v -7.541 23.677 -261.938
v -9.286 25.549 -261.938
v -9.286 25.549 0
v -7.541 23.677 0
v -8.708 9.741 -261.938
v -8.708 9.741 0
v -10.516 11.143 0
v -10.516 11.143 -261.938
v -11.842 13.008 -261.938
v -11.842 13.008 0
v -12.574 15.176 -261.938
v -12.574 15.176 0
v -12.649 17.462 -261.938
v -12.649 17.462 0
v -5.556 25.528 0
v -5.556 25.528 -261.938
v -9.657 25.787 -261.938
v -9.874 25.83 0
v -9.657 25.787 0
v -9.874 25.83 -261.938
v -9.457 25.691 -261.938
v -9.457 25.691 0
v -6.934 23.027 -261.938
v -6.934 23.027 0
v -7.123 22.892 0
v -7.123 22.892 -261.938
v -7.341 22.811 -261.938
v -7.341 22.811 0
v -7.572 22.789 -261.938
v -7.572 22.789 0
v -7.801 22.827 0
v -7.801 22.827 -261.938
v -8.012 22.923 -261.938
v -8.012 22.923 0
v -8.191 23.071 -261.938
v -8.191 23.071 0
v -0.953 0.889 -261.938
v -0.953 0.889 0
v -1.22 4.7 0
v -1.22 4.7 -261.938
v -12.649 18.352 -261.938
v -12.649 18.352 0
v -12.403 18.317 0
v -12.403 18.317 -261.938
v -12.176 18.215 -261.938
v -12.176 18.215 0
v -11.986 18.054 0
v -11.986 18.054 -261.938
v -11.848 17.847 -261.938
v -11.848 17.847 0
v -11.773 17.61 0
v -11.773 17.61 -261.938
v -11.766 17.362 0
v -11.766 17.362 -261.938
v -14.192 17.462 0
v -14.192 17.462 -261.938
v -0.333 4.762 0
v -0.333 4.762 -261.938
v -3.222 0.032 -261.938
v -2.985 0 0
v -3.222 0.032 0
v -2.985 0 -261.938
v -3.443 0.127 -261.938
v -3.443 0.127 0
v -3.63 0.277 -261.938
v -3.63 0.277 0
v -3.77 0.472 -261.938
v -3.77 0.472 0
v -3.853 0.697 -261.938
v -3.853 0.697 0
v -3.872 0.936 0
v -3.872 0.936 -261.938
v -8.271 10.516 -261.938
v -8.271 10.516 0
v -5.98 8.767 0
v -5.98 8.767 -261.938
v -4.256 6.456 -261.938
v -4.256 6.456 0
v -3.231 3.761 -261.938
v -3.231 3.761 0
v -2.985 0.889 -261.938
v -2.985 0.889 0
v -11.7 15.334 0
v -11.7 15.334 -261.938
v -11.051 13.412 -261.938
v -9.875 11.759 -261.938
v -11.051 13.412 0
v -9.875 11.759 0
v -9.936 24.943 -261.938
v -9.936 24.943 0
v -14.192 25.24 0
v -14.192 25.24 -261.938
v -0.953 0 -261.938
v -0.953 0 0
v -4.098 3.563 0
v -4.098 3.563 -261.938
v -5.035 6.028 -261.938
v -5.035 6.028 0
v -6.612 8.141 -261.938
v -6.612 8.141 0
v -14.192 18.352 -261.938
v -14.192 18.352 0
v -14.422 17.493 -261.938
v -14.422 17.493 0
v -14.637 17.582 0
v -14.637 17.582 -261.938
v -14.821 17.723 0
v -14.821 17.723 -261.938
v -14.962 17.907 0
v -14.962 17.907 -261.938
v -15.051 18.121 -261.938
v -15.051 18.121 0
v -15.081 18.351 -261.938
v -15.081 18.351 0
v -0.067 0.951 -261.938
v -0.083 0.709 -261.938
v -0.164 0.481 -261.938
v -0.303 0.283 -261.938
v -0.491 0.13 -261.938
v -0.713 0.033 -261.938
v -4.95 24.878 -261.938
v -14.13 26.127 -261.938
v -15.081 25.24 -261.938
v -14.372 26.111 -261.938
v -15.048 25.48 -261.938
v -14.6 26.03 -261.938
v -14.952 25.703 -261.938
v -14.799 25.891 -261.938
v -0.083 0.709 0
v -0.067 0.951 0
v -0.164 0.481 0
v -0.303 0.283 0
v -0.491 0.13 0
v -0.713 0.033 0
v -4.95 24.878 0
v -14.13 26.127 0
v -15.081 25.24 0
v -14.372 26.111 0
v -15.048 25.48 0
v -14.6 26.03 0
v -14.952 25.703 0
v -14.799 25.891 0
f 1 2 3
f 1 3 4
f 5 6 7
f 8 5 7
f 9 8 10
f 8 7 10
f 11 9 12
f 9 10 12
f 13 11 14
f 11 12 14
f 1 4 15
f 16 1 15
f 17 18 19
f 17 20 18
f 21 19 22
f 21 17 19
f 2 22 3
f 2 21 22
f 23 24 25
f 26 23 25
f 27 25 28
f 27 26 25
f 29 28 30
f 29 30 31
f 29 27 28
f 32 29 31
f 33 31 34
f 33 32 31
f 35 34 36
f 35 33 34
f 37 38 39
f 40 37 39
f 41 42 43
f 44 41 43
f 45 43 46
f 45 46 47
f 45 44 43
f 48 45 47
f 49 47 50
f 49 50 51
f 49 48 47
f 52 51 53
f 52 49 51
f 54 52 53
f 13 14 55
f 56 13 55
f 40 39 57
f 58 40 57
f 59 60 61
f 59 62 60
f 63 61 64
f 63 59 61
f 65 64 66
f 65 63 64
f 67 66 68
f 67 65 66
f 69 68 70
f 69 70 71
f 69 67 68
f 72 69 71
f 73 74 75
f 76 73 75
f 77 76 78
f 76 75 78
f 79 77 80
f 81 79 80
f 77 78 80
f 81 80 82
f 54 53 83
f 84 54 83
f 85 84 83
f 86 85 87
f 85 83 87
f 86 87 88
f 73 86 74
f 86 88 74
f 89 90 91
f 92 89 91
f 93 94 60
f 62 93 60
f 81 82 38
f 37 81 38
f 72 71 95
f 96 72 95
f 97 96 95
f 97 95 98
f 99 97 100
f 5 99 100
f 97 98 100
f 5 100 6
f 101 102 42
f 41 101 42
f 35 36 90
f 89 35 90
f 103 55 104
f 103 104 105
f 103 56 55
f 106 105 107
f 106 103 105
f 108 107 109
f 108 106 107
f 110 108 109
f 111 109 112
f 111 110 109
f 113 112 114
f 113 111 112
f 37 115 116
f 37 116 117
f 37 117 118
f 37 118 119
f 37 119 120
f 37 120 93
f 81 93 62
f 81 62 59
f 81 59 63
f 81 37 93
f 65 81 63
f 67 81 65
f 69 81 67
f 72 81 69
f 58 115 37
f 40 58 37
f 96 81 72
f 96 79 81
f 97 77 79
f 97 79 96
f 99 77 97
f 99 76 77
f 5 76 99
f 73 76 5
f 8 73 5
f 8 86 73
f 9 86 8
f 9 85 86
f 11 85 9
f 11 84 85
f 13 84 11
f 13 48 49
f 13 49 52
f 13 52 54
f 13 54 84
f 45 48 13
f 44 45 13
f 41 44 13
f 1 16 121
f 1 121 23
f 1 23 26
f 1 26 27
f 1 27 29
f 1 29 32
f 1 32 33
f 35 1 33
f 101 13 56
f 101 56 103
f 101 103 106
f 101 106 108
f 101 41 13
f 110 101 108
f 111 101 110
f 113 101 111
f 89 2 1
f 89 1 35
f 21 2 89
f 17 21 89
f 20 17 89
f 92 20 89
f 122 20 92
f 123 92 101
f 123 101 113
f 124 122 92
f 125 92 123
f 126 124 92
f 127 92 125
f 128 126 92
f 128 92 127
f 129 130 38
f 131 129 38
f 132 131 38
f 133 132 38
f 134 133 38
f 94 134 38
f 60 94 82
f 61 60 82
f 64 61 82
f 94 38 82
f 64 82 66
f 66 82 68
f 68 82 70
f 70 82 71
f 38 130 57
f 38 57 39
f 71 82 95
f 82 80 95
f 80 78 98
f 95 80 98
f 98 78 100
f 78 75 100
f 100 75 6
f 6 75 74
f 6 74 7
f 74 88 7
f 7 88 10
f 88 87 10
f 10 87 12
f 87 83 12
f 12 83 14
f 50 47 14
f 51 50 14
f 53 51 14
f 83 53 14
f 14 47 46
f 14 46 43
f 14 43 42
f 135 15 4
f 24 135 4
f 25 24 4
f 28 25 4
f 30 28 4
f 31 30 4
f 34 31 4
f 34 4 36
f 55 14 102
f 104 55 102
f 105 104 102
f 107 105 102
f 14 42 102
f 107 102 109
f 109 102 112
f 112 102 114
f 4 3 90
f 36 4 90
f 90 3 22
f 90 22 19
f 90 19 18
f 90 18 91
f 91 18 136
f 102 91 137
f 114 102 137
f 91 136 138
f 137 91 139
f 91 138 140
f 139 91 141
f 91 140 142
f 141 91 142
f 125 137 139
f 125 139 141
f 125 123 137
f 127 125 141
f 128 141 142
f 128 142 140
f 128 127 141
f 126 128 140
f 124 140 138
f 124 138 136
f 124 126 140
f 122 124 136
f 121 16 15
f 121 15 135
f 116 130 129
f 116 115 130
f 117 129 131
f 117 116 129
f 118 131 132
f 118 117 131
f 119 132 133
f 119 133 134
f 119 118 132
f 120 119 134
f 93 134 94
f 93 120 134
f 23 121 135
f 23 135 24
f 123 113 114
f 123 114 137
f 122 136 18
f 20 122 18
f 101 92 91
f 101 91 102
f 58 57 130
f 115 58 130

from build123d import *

# Parameters (mm, degrees)
EXTRUDE_THIN1_DEPTH = 261.9375
FILLET1_R           = 0.889


with BuildPart() as part:
    # Sketch1 → Extrude-Thin1 (new body)
    with BuildSketch(Plane.XY):
        with BuildLine():
            Line((-0.333026442, 4.7625), (0, 0))
            Line((0, 0), (-3.96875, 0))
            ThreePointArc((-3.96875, 0), (-4.818557487, 5.609954997), (-8.7077172, 9.741323362))
            ThreePointArc((-8.7077172, 9.741323362), (-11.842464504, 13.007739441), (-12.649448407, 17.4625))
            Line((-12.649448407, 17.4625), (-15.08125, 17.4625))
            Line((-15.08125, 17.4625), (-15.08125, 26.19375))
            Line((-15.08125, 26.19375), (-9.525, 25.805219151))
            Line((-9.525, 25.805219151), (-7.540625, 23.677237492))
            Line((-7.540625, 23.677237492), (-5.55625, 25.527697116))
            Line((-5.55625, 25.527697116), (-4.949953458, 24.877523675))
            Line((-4.949953458, 24.877523675), (-7.584501899, 22.420767509))
            Line((-7.584501899, 22.420767509), (-9.936346881, 24.94281248))
            Line((-9.936346881, 24.94281248), (-14.19225, 25.240414217))
            Line((-14.19225, 25.240414217), (-14.19225, 18.3515))
            Line((-14.19225, 18.3515), (-11.579833127, 18.3515))
            ThreePointArc((-11.579833127, 18.3515), (-11.263384071, 13.868774929), (-8.271283672, 10.515821118))
            ThreePointArc((-8.271283672, 10.515821118), (-4.255672213, 6.4560014), (-2.984543996, 0.889))
            Line((-2.984543996, 0.889), (-0.953335783, 0.889))
            Line((-0.953335783, 0.889), (-1.219860883, 4.700486495))
            Line((-1.219860883, 4.700486495), (-0.333026442, 4.7625))
        make_face()
    extrude(amount=-EXTRUDE_THIN1_DEPTH)

    # Fillet1
    fillet1_edges = [part.edges().sort_by_distance(p)[0] for p in [
        (-7.584501899, 22.420767509, -130.96875),
        (-11.579833127, 18.3515, -130.96875),
        (0, 0, -130.96875),
        (-3.96875, 0, -130.96875),
        (-15.08125, 17.4625, -130.96875),
        (-15.08125, 26.19375, -130.96875),
        (-9.525, 25.805219151, -130.96875),
    ]]
    fillet(fillet1_edges, radius=FILLET1_R)


solid = part.part
